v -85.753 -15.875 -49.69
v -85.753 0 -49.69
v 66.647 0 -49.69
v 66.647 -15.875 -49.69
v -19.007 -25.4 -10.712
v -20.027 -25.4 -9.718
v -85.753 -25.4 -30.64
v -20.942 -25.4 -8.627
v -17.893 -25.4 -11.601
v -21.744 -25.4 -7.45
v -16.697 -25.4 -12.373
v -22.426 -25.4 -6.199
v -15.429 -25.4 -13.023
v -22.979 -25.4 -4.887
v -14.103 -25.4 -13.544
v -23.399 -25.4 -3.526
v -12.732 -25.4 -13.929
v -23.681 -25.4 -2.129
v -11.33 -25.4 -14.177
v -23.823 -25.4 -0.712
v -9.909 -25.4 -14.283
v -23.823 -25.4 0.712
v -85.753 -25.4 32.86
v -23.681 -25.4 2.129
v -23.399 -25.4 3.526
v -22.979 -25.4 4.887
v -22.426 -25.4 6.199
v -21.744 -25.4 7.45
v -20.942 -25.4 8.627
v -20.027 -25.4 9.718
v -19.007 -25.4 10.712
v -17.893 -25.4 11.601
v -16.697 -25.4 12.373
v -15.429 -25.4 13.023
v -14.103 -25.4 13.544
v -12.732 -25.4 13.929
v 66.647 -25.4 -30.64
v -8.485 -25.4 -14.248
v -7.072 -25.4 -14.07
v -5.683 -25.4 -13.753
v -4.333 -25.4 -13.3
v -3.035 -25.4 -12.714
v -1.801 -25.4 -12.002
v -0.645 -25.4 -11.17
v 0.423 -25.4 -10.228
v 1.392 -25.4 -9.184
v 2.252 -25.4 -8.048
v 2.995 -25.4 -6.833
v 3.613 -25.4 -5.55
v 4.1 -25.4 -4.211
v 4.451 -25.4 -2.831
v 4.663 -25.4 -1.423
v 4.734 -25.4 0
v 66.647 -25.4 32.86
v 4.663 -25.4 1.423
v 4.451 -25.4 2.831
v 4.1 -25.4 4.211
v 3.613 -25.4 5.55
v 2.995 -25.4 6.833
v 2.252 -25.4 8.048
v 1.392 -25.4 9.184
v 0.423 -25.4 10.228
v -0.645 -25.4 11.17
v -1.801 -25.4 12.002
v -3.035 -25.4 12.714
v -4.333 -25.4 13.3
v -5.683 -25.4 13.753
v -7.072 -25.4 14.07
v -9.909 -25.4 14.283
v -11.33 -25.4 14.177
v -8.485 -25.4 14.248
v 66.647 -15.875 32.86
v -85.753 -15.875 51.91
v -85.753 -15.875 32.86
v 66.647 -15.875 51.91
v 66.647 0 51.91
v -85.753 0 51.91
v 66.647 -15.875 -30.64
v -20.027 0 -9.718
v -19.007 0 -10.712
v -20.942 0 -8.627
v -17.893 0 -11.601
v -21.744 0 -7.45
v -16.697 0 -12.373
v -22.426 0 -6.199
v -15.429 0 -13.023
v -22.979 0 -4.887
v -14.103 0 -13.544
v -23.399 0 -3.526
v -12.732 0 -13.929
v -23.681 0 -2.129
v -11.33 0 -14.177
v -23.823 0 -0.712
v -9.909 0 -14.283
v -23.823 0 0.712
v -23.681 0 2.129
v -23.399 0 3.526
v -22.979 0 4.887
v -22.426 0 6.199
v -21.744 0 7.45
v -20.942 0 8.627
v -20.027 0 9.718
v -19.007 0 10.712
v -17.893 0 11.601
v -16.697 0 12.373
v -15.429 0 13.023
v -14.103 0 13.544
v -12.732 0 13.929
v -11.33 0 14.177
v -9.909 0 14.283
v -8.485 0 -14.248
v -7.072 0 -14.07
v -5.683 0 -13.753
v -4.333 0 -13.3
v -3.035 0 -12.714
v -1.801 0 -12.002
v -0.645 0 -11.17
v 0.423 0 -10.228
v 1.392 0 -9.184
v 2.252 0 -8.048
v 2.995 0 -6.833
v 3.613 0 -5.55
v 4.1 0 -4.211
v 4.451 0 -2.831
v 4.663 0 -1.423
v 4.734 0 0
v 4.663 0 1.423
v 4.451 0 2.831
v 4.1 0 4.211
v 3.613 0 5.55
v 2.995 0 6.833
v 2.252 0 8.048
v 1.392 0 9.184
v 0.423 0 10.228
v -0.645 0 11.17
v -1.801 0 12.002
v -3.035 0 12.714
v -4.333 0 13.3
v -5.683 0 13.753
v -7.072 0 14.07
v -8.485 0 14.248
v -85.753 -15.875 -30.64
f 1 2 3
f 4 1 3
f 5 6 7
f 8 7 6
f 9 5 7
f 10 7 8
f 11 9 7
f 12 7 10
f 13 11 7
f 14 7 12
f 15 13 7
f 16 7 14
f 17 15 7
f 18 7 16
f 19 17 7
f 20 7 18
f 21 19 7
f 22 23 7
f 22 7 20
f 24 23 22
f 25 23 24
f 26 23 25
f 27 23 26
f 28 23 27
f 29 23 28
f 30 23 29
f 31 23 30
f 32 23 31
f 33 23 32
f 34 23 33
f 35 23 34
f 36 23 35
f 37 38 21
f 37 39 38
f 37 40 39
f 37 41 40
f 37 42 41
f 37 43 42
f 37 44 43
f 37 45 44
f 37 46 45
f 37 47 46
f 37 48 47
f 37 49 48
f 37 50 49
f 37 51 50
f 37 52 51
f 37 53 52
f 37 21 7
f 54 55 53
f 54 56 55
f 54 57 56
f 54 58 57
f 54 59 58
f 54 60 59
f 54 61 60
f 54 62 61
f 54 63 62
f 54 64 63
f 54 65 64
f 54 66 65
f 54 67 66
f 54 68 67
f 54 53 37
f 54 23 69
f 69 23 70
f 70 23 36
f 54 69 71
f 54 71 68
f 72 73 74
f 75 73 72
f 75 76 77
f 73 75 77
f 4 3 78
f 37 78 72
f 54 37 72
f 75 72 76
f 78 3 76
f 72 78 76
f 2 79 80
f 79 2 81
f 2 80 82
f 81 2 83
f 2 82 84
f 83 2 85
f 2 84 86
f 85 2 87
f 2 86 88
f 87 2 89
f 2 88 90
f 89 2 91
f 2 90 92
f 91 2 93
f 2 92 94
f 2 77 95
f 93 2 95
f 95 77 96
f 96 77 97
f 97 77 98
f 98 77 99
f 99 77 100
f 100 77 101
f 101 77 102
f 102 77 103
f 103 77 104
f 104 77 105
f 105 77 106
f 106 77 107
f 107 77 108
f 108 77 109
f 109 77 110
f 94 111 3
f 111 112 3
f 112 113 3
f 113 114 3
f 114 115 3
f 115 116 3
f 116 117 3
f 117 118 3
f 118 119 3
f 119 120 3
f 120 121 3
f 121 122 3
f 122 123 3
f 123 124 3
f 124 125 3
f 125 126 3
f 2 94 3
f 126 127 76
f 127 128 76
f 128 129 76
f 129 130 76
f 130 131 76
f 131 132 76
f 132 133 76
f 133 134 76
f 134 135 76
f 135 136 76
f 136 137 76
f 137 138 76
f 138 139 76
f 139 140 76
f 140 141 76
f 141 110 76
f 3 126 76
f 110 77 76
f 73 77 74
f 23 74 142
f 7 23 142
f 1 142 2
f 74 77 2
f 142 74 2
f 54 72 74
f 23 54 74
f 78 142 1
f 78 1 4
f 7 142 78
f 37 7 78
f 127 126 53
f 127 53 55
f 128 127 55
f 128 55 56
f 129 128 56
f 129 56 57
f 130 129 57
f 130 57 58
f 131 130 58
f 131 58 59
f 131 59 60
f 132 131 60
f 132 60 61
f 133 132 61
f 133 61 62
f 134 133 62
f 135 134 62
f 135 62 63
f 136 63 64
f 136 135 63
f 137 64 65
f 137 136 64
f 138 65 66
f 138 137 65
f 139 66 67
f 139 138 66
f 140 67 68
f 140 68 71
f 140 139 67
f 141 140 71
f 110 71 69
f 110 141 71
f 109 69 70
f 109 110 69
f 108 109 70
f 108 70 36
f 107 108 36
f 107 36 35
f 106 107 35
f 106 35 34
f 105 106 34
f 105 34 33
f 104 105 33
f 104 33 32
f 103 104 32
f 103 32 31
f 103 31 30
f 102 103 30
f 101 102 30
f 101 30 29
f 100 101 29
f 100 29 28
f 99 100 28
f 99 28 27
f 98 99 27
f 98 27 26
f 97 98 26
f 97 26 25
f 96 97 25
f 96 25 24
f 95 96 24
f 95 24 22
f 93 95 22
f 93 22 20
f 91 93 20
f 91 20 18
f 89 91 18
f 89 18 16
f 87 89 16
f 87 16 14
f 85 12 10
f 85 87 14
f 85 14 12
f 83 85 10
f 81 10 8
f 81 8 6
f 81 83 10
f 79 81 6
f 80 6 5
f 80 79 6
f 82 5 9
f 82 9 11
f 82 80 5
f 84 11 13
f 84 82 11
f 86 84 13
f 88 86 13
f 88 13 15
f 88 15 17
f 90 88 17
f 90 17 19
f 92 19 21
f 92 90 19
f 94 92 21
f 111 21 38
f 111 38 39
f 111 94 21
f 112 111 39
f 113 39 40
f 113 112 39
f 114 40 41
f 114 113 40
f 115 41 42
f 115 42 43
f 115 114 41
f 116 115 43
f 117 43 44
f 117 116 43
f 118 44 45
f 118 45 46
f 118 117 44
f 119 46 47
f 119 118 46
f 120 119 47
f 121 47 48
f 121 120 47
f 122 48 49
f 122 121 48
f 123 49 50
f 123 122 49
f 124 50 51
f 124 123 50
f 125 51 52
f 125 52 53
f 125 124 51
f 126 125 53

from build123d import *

# Parameters (mm, degrees)
F0_R     = 14.2875
F0_W     = 152.4
F0_H     = 19.05
F1_DEPTH = 15.875
F2_DEPTH = 25.4


with BuildPart() as f1:
    # F0 (on Front) → F1 (new body)
    with BuildSketch(Plane.XZ):
        Polygon((-9.553027, 51.909848), (-85.753027, 51.909848), (-85.753027, 32.859848), (66.646973, 32.859848), (66.646973, 51.909848), align=None)
        Polygon((66.646973, 32.859848), (-85.753027, 32.859848), (-85.753027, -30.640152), (66.646973, -30.640152), (66.646973, 0), align=None)
        with Locations((-9.553027, 0)):
            Circle(F0_R, mode=Mode.SUBTRACT)
        with Locations((-9.553027, -40.165152)):
            Rectangle(F0_W, F0_H)
    extrude(amount=F1_DEPTH)

    # F0 (on Front) → F2 (join)
    with BuildSketch(Plane.XZ):
        Polygon((66.646973, 32.859848), (-85.753027, 32.859848), (-85.753027, -30.640152), (66.646973, -30.640152), (66.646973, 0), align=None)
        with Locations((-9.553027, 0)):
            Circle(F0_R, mode=Mode.SUBTRACT)
    extrude(amount=F2_DEPTH)


solid = f1.part
